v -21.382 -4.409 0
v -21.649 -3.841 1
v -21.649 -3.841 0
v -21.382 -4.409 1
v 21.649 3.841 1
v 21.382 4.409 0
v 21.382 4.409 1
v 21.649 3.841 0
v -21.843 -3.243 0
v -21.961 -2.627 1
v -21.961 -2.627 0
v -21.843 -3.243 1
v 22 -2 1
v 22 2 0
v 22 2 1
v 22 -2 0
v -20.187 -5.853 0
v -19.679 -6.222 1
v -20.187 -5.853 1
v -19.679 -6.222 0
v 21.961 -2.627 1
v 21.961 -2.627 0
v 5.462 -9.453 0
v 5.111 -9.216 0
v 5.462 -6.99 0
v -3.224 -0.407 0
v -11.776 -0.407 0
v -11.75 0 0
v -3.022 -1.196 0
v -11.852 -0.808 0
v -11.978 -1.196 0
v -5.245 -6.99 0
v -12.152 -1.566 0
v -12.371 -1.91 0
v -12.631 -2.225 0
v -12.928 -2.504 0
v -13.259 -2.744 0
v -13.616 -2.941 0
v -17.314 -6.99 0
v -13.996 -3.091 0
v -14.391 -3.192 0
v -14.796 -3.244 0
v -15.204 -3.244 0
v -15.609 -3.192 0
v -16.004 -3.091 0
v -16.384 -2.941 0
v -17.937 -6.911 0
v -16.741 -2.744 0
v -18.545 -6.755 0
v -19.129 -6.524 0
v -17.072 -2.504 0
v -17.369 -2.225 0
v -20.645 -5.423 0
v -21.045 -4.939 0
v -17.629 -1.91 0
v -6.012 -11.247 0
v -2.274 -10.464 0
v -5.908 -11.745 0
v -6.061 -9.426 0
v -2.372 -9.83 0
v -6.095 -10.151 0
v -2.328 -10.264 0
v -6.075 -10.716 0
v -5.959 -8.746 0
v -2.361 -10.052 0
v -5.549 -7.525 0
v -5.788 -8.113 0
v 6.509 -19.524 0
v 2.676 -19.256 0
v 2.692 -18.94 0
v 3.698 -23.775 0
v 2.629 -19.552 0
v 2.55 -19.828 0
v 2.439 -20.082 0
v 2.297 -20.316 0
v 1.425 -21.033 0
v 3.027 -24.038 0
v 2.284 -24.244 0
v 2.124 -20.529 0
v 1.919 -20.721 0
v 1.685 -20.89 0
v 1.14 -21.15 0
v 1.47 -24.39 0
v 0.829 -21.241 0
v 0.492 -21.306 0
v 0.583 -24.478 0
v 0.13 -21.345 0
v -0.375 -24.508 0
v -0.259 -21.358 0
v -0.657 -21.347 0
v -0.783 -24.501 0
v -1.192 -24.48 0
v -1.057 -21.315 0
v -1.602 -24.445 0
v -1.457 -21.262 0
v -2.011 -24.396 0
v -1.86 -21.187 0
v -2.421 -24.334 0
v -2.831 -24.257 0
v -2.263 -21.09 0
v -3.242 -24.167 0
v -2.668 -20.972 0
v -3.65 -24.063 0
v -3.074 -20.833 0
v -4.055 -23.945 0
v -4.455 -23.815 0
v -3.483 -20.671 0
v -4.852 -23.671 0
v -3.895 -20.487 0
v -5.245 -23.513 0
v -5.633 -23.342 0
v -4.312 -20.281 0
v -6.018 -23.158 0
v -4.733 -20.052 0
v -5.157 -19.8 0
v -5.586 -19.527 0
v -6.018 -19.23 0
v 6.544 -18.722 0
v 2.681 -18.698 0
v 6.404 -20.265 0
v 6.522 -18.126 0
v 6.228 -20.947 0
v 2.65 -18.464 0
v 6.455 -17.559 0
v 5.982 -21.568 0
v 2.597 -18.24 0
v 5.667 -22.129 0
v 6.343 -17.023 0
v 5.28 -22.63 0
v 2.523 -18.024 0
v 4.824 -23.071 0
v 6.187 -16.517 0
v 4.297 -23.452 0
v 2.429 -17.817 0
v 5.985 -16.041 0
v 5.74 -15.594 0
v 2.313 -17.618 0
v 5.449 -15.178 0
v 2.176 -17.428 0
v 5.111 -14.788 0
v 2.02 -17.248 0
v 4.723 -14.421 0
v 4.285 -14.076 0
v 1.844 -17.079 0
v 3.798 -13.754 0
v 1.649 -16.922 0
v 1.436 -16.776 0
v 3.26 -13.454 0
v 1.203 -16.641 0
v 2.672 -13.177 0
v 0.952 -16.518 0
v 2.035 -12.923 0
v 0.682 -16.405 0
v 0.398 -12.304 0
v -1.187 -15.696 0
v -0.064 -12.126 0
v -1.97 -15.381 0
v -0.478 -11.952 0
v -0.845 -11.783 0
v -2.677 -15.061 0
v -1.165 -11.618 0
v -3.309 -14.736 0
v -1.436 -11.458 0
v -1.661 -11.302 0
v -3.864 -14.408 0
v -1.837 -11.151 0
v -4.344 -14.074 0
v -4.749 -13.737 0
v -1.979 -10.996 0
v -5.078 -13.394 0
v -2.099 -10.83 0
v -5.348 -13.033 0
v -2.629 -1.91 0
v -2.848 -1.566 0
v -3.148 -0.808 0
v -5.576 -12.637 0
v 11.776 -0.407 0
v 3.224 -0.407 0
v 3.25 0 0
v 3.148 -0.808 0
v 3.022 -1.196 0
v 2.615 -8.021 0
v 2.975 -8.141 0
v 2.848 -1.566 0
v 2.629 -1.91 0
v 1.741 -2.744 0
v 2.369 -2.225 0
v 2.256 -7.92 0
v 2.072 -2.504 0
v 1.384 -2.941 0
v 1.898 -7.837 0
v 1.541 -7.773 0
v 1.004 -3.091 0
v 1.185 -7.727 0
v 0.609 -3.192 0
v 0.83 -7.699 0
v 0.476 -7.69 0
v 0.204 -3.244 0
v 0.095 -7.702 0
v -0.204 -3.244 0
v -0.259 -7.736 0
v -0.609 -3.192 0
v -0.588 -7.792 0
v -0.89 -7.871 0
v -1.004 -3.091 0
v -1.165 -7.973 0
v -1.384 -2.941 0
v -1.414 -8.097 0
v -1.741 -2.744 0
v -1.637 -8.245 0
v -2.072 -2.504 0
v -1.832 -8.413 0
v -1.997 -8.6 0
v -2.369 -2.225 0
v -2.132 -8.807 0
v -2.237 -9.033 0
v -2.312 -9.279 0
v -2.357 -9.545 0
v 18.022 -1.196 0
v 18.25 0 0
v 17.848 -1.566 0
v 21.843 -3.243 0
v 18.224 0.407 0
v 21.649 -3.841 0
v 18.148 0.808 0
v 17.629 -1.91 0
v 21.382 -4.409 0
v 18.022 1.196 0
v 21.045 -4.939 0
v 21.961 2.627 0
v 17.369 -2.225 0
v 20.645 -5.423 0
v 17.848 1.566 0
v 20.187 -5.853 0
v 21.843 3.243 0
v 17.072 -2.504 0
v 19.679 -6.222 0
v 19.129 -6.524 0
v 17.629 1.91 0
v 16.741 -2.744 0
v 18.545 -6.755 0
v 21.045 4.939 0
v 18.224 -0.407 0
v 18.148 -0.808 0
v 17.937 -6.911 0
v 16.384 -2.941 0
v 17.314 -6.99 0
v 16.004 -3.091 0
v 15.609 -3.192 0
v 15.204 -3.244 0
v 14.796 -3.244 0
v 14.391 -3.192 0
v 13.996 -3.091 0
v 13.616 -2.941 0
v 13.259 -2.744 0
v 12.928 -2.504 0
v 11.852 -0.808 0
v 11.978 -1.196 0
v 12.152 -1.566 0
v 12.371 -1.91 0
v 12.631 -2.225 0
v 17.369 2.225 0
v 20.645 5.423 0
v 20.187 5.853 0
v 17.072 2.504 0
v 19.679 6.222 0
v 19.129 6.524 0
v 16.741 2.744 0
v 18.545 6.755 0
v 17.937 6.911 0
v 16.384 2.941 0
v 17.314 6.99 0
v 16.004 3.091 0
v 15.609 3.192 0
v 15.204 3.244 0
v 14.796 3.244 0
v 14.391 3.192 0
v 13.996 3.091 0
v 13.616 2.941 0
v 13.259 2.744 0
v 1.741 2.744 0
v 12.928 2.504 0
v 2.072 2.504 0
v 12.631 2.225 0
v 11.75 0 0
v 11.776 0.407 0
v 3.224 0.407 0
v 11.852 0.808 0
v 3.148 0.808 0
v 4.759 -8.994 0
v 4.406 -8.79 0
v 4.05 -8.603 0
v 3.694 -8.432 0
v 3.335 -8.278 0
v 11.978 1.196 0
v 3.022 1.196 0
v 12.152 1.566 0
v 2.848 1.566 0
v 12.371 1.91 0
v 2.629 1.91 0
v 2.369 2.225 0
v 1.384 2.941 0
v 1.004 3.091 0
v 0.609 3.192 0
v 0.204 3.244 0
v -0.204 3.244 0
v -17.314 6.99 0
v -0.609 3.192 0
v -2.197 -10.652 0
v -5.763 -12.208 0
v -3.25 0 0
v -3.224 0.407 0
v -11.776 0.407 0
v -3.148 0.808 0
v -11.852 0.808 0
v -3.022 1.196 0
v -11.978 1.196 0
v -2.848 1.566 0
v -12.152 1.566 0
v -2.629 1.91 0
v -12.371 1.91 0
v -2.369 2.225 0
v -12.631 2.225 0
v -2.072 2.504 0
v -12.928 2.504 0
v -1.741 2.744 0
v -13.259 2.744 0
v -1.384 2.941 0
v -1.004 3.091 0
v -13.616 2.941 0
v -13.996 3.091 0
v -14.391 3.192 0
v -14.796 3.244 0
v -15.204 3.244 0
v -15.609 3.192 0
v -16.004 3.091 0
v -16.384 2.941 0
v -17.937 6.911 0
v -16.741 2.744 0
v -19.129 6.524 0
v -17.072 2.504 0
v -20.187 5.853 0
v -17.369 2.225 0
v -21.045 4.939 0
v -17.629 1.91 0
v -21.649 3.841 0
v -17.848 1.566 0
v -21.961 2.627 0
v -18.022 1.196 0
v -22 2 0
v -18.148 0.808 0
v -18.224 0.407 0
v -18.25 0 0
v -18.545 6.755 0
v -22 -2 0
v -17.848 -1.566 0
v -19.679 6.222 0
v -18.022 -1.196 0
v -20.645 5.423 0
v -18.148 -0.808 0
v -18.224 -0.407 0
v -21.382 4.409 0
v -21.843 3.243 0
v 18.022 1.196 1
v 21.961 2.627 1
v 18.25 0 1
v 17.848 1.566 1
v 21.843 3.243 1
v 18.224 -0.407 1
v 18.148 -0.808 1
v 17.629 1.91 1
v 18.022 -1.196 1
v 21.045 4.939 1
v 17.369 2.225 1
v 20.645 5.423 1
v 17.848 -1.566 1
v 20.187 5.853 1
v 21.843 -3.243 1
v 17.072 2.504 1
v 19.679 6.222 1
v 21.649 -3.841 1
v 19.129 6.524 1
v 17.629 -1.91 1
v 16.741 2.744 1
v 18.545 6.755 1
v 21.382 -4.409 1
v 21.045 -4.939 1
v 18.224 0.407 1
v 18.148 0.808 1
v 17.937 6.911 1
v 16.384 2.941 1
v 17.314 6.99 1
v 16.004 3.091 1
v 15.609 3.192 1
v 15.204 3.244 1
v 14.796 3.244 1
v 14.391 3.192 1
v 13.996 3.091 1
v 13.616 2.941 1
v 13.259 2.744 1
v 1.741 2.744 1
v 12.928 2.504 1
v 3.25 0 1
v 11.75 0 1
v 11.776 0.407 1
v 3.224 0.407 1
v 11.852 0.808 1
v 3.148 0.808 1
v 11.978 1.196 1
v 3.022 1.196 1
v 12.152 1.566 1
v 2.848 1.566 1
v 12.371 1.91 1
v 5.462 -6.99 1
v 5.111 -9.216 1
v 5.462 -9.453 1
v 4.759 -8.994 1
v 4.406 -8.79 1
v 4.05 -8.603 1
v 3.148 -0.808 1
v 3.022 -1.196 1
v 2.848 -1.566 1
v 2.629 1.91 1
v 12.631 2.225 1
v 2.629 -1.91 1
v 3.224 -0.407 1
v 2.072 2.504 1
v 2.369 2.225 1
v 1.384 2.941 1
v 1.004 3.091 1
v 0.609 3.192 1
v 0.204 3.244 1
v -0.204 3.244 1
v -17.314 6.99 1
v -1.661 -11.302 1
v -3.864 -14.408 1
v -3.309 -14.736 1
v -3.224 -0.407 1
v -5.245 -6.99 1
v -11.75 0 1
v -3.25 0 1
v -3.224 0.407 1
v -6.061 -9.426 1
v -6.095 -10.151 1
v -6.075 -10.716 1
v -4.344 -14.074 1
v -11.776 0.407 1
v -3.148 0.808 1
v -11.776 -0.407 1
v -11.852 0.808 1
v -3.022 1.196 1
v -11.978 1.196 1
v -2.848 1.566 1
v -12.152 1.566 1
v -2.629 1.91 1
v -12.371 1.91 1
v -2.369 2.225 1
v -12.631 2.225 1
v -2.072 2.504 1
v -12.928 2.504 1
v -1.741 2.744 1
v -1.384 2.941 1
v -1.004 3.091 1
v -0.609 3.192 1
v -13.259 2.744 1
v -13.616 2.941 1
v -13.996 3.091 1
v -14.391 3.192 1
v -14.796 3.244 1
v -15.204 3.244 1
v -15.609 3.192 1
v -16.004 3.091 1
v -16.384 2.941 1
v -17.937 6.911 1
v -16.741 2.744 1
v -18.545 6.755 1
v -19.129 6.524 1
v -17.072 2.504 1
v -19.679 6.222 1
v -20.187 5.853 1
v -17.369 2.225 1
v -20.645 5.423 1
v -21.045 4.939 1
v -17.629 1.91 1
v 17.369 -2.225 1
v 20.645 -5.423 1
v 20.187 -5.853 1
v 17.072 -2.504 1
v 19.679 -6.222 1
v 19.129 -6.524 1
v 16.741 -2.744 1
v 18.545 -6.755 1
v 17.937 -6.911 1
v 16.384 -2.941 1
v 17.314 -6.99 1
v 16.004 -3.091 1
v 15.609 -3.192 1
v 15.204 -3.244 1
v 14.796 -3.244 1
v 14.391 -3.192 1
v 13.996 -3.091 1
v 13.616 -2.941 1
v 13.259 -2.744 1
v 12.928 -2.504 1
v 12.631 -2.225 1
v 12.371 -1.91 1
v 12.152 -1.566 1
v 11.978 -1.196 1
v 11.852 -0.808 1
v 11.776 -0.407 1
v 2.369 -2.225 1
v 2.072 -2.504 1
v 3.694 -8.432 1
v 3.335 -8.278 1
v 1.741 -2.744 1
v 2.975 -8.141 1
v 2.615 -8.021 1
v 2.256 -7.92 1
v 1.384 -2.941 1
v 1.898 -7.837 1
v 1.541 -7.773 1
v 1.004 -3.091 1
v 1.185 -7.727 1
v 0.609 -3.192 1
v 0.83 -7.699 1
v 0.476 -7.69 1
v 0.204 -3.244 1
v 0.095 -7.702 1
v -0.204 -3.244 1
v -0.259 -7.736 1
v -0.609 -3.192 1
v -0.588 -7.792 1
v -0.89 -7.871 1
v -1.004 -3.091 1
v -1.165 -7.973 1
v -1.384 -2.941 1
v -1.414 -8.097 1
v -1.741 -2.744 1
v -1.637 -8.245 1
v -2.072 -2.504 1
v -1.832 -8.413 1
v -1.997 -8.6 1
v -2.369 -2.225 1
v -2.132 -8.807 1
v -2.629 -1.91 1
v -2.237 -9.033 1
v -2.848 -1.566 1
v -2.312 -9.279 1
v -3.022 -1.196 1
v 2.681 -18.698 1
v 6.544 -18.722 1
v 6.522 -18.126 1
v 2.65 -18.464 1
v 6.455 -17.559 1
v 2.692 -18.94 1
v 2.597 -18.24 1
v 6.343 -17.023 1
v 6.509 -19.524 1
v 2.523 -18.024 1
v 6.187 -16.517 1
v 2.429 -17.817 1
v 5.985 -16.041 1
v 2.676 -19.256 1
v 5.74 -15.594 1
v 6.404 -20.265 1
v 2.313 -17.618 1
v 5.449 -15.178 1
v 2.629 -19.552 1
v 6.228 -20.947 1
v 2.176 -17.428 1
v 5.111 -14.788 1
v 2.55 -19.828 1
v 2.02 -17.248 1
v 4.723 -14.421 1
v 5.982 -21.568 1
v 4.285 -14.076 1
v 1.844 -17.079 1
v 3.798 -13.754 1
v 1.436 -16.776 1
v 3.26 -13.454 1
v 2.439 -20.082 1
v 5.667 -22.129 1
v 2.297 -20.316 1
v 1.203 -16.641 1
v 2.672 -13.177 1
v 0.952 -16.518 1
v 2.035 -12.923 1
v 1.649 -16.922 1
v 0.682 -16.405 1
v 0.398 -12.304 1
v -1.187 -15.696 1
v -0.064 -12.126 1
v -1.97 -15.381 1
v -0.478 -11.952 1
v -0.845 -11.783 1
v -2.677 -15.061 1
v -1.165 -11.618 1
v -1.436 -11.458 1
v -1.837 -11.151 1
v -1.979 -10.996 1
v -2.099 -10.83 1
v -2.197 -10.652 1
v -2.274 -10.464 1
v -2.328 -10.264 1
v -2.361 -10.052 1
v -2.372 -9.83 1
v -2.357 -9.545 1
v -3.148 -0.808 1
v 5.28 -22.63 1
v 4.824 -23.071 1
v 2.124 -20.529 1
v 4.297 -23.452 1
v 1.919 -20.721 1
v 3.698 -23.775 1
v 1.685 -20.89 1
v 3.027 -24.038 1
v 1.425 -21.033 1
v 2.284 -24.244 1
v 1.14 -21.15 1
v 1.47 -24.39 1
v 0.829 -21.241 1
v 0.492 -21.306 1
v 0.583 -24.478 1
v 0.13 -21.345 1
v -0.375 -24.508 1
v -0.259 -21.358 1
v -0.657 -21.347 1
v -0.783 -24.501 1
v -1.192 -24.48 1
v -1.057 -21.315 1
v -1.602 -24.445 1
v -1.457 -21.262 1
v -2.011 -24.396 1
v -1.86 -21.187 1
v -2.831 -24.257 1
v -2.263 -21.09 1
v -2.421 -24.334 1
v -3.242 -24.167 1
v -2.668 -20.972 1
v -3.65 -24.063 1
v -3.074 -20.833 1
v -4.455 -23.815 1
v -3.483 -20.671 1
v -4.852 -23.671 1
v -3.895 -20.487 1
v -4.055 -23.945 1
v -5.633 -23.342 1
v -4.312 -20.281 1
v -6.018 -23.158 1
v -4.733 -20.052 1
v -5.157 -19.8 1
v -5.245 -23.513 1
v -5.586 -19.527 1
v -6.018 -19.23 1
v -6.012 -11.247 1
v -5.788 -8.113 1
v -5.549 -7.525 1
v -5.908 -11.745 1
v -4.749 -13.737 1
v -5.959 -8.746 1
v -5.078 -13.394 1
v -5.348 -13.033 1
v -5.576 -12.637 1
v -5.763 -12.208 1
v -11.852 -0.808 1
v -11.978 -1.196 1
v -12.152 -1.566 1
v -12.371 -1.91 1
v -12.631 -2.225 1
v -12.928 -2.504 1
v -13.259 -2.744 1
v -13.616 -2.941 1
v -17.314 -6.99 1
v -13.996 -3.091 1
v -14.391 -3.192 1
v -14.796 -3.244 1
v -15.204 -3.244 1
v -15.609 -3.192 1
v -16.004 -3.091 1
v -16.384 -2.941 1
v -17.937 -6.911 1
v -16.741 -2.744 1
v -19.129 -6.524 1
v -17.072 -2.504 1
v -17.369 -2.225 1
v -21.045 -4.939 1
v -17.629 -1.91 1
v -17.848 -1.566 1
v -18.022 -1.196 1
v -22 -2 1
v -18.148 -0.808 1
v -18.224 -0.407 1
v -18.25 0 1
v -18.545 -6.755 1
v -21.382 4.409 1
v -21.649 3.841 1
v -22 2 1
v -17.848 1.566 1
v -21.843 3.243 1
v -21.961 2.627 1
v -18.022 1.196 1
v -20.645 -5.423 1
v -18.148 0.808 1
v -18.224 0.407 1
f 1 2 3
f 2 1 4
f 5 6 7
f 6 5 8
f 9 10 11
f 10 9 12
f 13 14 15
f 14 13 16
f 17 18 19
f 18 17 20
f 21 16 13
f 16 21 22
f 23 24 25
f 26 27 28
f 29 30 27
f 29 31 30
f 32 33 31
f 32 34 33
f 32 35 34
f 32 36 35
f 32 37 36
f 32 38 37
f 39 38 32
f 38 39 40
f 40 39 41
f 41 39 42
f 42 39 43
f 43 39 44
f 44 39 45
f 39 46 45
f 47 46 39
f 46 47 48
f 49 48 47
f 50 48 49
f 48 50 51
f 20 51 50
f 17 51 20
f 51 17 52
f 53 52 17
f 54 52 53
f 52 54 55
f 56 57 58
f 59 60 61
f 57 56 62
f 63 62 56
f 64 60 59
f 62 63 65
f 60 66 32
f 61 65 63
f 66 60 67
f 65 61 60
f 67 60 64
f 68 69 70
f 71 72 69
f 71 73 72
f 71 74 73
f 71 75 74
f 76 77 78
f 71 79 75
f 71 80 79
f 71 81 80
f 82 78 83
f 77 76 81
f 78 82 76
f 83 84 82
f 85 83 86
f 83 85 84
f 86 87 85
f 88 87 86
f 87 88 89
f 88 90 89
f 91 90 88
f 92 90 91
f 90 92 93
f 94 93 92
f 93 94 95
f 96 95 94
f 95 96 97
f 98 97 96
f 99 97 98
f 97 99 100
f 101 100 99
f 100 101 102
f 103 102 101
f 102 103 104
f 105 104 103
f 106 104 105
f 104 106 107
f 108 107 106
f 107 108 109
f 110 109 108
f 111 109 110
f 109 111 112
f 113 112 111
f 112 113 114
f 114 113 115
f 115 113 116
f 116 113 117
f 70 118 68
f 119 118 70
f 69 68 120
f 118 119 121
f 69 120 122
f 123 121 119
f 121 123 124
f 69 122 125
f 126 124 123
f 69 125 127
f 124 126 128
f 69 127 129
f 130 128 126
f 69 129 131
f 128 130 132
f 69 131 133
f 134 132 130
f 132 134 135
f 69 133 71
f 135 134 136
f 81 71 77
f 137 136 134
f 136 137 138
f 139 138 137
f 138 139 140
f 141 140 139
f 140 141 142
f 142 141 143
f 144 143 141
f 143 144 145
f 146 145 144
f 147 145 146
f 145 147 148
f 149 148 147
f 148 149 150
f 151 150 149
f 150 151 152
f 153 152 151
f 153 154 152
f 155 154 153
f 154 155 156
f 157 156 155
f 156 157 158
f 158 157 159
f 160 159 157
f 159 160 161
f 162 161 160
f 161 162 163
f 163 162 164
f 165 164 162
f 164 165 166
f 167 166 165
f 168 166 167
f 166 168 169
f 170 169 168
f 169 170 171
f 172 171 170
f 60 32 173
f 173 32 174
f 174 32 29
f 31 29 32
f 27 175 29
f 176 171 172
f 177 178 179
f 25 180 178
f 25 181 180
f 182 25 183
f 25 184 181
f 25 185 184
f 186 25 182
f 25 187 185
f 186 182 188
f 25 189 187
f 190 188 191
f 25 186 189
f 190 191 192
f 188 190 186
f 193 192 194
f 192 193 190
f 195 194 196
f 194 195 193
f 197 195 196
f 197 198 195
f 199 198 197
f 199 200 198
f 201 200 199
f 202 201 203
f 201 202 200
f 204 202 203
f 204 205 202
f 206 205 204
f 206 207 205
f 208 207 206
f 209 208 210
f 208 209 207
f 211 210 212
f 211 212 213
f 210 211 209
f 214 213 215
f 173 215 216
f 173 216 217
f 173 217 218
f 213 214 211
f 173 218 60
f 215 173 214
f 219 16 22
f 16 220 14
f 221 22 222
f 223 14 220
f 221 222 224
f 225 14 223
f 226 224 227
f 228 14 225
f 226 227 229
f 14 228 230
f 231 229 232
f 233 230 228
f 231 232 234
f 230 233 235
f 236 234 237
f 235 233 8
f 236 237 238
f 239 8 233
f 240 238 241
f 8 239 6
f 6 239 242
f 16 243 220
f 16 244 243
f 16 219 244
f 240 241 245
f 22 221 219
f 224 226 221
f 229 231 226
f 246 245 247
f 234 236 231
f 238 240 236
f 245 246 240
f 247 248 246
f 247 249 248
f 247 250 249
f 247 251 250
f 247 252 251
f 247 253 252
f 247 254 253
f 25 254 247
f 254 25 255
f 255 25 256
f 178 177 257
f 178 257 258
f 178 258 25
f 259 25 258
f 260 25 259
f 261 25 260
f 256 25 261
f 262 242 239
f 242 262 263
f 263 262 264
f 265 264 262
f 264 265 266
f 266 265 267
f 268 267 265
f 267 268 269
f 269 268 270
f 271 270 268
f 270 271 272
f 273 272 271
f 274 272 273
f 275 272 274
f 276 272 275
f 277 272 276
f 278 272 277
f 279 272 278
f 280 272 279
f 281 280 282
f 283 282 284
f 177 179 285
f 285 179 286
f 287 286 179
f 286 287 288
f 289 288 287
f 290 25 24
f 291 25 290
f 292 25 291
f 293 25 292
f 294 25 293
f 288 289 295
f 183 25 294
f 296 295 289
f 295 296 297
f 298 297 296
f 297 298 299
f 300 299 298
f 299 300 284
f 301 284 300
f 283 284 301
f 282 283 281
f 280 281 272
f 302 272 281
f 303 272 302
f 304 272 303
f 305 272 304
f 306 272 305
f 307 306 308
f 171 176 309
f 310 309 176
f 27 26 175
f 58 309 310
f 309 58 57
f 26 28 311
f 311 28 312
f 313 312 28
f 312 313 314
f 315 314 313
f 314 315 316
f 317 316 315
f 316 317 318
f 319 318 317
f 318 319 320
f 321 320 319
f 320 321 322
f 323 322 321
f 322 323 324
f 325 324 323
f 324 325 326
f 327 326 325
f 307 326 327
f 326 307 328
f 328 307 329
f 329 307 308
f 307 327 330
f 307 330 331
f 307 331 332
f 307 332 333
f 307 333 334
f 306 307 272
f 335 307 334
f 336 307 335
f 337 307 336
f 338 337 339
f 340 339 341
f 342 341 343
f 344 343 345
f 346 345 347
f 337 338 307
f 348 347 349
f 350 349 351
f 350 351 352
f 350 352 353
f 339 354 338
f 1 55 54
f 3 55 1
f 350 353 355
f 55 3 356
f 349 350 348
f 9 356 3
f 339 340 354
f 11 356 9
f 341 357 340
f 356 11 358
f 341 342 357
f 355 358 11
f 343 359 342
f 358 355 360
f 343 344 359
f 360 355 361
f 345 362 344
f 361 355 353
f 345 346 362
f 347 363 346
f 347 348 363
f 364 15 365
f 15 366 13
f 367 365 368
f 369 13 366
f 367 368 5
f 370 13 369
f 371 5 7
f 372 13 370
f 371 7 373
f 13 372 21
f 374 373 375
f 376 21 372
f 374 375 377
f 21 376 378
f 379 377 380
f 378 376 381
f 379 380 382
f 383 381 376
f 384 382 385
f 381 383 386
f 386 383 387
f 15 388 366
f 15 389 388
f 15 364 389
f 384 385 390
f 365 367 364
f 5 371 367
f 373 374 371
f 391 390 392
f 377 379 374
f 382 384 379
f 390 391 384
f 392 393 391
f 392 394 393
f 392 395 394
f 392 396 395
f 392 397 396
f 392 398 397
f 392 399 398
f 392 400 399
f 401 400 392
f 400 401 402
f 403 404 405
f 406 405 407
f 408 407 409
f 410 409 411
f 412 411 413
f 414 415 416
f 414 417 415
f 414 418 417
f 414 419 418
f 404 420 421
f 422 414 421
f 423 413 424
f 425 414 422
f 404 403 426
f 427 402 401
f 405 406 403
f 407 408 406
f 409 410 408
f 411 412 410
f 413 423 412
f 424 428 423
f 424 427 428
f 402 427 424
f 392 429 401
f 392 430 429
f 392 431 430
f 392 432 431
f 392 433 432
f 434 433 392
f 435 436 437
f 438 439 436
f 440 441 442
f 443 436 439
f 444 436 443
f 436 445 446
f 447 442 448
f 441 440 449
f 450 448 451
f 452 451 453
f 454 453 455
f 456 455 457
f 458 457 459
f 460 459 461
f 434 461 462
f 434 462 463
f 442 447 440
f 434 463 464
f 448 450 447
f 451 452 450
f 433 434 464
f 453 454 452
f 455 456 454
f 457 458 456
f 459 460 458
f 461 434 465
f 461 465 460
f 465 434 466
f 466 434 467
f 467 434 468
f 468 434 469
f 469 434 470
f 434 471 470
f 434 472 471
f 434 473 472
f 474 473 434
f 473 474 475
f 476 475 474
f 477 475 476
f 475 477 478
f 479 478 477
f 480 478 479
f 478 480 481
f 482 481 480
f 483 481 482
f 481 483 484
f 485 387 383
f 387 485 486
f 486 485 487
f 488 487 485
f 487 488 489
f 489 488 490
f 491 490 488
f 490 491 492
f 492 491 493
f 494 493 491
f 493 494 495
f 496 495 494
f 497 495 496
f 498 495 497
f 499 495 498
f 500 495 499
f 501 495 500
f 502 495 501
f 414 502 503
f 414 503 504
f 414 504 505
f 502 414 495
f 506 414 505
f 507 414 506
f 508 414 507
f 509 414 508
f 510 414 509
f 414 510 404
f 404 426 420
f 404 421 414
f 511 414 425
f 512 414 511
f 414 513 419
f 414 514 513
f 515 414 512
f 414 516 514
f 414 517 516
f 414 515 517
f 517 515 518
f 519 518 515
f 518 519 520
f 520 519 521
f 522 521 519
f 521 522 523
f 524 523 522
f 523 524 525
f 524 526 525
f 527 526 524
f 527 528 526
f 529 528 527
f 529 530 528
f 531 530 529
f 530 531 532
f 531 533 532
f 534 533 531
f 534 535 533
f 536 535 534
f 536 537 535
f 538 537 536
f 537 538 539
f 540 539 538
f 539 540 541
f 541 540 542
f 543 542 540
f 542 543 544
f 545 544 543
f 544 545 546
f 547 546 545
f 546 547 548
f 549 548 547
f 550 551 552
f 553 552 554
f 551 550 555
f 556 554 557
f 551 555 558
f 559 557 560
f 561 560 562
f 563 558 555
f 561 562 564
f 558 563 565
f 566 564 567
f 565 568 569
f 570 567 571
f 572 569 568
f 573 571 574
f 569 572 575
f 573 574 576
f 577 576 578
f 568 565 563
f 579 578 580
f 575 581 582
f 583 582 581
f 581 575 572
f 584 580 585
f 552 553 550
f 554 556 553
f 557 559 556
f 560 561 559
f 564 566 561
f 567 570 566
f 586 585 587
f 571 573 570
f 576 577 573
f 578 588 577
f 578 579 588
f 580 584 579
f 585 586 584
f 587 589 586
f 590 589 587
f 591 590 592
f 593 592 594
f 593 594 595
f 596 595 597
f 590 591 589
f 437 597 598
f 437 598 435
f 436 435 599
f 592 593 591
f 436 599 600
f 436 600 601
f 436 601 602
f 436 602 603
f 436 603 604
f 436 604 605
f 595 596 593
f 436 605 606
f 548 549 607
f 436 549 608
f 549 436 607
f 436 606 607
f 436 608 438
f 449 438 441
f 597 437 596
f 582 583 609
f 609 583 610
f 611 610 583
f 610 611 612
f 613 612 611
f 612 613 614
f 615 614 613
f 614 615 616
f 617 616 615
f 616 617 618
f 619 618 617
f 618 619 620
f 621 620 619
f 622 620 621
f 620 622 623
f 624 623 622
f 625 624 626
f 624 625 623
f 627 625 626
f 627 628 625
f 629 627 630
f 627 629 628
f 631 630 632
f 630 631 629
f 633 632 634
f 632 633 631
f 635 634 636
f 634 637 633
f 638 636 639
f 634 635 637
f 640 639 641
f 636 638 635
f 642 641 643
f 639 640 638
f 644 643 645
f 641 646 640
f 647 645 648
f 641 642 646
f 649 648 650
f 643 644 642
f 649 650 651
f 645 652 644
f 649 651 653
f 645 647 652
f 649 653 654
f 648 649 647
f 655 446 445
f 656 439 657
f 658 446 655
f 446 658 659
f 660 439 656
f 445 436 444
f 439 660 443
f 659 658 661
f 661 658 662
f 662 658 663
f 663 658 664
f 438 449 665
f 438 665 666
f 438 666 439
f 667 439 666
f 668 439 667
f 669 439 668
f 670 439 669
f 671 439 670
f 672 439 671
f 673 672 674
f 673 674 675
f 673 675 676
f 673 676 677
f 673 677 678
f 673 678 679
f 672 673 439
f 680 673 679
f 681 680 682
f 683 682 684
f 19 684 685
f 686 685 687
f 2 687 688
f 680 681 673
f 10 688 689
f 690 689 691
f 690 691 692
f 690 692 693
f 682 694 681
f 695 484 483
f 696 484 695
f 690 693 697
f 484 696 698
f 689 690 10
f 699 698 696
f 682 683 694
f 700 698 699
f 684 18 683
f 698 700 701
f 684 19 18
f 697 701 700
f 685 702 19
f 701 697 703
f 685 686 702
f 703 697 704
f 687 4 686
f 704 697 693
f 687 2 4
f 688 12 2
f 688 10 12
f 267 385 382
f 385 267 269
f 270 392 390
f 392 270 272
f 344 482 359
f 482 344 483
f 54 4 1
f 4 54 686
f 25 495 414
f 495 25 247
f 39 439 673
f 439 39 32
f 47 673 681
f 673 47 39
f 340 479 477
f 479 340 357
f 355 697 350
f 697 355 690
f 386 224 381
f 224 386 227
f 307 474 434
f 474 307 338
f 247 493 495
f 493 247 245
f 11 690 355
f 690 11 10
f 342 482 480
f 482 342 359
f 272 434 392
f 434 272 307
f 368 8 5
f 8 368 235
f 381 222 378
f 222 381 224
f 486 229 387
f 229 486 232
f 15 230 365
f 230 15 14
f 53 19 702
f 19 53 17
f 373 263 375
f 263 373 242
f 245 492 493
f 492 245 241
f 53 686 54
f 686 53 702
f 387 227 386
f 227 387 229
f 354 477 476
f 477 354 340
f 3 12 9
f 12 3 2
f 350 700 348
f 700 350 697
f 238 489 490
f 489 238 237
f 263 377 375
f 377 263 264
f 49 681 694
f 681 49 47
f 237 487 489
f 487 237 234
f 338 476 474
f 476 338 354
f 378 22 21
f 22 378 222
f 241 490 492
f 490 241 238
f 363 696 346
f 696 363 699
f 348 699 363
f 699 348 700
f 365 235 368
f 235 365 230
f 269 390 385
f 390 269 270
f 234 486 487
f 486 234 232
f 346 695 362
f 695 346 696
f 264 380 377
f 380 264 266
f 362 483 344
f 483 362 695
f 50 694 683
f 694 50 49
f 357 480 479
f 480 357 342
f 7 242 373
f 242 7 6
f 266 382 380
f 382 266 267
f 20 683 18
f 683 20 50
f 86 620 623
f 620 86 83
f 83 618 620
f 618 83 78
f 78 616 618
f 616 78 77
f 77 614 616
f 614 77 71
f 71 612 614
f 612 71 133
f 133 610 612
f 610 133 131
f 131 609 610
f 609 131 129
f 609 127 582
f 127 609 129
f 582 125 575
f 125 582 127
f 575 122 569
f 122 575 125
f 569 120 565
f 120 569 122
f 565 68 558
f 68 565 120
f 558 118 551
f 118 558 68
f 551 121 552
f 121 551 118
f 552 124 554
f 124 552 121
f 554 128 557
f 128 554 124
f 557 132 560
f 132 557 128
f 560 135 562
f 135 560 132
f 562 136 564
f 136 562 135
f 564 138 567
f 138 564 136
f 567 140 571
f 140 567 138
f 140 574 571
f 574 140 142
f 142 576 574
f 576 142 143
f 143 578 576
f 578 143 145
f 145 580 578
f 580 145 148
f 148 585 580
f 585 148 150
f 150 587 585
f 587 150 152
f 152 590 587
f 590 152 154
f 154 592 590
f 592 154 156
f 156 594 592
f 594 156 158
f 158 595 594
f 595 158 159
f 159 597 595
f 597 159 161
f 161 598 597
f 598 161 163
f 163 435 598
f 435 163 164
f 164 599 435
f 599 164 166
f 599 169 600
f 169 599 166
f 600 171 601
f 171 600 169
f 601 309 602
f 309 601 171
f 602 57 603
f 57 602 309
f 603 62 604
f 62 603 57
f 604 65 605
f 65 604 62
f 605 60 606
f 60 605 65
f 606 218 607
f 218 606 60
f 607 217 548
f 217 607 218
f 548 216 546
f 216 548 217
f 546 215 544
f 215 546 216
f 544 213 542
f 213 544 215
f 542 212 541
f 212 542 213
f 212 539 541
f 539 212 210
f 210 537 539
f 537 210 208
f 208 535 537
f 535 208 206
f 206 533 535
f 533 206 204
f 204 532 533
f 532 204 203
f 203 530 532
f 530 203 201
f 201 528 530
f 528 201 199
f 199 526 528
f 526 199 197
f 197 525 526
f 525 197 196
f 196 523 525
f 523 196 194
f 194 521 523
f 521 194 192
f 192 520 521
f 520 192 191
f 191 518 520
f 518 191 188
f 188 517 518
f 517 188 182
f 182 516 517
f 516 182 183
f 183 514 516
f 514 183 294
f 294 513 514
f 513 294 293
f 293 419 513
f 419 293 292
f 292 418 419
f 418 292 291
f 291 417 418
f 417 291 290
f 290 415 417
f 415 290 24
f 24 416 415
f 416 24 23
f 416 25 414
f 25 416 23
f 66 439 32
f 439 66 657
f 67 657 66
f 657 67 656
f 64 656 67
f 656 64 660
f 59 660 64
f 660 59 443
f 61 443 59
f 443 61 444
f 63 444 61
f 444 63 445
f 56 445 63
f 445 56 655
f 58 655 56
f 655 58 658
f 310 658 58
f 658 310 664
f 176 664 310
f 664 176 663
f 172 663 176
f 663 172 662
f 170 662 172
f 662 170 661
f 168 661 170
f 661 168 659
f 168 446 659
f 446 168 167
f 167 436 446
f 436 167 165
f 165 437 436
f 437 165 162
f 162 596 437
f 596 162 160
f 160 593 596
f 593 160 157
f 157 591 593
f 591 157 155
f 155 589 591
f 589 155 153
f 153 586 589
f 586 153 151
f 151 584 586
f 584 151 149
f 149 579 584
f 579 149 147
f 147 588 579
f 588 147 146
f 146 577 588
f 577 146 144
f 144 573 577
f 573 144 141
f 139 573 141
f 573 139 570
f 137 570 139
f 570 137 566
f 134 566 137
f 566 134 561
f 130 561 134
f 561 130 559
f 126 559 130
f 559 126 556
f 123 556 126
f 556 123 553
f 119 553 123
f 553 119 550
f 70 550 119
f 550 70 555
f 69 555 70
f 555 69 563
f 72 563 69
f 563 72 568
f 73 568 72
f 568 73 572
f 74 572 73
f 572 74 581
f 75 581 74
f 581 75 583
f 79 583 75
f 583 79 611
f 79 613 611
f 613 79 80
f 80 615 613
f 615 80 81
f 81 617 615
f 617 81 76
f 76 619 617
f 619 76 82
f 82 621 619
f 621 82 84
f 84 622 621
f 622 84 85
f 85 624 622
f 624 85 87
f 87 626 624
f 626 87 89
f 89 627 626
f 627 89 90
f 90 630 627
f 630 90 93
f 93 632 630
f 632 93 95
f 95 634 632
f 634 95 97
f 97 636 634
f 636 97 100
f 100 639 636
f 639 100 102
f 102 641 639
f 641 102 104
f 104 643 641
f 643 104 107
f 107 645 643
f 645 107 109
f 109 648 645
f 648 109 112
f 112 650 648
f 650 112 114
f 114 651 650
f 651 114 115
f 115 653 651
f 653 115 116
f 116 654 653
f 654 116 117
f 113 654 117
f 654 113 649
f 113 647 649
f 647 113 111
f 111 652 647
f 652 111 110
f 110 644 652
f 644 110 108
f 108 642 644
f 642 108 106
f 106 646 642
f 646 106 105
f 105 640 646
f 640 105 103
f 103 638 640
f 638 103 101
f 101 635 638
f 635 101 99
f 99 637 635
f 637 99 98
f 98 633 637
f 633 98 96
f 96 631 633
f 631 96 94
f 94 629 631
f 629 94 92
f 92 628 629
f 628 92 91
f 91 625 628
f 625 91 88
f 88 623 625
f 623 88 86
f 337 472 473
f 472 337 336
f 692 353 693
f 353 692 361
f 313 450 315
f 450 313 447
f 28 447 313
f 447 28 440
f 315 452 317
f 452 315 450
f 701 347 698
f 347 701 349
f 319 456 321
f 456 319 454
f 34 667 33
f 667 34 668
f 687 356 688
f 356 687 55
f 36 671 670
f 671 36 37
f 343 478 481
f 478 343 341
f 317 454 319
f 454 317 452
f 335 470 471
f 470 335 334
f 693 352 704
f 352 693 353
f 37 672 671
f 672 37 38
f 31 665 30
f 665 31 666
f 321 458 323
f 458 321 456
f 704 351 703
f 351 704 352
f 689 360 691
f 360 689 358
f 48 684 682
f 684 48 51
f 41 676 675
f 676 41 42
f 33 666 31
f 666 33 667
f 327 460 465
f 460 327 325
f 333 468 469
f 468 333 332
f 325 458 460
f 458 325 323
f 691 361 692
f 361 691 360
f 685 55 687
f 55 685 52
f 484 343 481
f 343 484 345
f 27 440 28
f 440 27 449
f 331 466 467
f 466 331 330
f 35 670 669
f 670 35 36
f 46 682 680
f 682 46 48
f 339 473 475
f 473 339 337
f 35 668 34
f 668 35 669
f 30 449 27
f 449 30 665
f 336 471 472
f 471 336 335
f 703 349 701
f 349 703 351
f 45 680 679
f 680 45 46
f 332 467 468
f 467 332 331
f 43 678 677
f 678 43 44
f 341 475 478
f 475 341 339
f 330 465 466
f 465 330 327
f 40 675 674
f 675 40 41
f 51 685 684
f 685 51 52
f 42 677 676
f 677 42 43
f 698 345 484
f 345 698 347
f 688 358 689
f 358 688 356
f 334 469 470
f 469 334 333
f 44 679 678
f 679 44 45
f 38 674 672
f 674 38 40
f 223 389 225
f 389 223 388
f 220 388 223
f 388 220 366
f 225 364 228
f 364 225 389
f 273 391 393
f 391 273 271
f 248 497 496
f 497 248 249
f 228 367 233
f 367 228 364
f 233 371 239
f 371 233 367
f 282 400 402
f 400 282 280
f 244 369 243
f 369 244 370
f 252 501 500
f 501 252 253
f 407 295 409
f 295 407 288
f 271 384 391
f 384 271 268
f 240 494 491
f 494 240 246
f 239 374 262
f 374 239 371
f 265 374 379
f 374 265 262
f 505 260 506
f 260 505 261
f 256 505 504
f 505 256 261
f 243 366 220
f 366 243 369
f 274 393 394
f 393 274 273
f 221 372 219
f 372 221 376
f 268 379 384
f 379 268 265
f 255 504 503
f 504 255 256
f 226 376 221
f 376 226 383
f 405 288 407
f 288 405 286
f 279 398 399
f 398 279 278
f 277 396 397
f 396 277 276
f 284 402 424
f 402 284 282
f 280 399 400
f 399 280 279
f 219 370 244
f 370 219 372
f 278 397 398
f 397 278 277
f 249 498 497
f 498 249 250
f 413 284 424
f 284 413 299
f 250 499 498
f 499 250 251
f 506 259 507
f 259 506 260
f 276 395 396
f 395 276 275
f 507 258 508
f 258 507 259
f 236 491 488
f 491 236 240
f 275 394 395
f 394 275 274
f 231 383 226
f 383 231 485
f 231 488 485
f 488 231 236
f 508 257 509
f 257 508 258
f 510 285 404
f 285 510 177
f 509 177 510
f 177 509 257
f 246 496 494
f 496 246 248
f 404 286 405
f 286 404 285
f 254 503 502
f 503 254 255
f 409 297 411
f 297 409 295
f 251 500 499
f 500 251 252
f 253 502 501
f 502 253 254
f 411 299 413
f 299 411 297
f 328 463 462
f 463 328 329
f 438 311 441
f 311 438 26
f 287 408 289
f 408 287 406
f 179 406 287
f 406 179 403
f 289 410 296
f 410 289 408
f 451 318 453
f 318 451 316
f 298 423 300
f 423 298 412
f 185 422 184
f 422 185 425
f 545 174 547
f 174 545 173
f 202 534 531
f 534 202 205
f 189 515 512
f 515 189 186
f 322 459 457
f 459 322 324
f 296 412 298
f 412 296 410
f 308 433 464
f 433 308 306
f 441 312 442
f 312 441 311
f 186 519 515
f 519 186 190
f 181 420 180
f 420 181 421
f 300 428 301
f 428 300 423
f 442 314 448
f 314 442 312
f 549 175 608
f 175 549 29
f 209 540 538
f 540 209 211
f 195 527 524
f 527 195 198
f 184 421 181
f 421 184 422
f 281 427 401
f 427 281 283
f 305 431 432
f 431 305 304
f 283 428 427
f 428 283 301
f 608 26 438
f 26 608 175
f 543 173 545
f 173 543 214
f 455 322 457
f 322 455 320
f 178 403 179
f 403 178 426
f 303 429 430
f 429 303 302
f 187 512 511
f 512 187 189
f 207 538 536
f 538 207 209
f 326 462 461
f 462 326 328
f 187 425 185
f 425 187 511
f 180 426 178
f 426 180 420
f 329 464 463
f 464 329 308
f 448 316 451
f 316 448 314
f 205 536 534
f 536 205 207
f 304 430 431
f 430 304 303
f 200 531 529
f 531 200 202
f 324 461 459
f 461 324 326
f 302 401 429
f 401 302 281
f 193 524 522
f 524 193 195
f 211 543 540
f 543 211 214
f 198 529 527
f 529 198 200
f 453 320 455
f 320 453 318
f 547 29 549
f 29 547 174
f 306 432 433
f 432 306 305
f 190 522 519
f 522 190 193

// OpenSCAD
$fn = 50;


difference() {
	union() {
		translate(v = [0, 0, 0]) {
			rotate(a = [0, 0, 0]) {
				hull() {
					translate(v = [-17.0000000000, 2.0000000000, 0]) {
						rotate(a = [0, 0, 0]) {
							translate(v = [0, 0, 0]) {
								rotate(a = [0, 0, 0]) {
									cylinder(h = 1, r = 5);
								}
							}
						}
					}
					translate(v = [17.0000000000, 2.0000000000, 0]) {
						rotate(a = [0, 0, 0]) {
							translate(v = [0, 0, 0]) {
								rotate(a = [0, 0, 0]) {
									cylinder(h = 1, r = 5);
								}
							}
						}
					}
					translate(v = [-17.0000000000, -2.0000000000, 0]) {
						rotate(a = [0, 0, 0]) {
							translate(v = [0, 0, 0]) {
								rotate(a = [0, 0, 0]) {
									cylinder(h = 1, r = 5);
								}
							}
						}
					}
					translate(v = [17.0000000000, -2.0000000000, 0]) {
						rotate(a = [0, 0, 0]) {
							translate(v = [0, 0, 0]) {
								rotate(a = [0, 0, 0]) {
									cylinder(h = 1, r = 5);
								}
							}
						}
					}
				}
			}
		}
		translate(v = [0, -5, 0]) {
			rotate(a = [0, 0, 0]) {
				linear_extrude(height = 1) {
					text(font = "DejaVu Sans Mono:style=Bold", halign = "center", size = 19.0000000000, text = "S", valign = "top");
				}
			}
		}
	}
	union() {
		translate(v = [-15.0000000000, 0.0000000000, -125.0000000000]) {
			rotate(a = [0, 0, 0]) {
				cylinder(h = 250, r = 3.2500000000);
			}
		}
		translate(v = [15.0000000000, 0.0000000000, -125.0000000000]) {
			rotate(a = [0, 0, 0]) {
				cylinder(h = 250, r = 3.2500000000);
			}
		}
		translate(v = [15.0000000000, 0.0000000000, -125.0000000000]) {
			rotate(a = [0, 0, 0]) {
				cylinder(h = 250, r = 3.2500000000);
			}
		}
		translate(v = [0, 0, -125.0000000000]) {
			rotate(a = [0, 0, 0]) {
				cylinder(h = 250, r = 3.2500000000);
			}
		}
	}
}
